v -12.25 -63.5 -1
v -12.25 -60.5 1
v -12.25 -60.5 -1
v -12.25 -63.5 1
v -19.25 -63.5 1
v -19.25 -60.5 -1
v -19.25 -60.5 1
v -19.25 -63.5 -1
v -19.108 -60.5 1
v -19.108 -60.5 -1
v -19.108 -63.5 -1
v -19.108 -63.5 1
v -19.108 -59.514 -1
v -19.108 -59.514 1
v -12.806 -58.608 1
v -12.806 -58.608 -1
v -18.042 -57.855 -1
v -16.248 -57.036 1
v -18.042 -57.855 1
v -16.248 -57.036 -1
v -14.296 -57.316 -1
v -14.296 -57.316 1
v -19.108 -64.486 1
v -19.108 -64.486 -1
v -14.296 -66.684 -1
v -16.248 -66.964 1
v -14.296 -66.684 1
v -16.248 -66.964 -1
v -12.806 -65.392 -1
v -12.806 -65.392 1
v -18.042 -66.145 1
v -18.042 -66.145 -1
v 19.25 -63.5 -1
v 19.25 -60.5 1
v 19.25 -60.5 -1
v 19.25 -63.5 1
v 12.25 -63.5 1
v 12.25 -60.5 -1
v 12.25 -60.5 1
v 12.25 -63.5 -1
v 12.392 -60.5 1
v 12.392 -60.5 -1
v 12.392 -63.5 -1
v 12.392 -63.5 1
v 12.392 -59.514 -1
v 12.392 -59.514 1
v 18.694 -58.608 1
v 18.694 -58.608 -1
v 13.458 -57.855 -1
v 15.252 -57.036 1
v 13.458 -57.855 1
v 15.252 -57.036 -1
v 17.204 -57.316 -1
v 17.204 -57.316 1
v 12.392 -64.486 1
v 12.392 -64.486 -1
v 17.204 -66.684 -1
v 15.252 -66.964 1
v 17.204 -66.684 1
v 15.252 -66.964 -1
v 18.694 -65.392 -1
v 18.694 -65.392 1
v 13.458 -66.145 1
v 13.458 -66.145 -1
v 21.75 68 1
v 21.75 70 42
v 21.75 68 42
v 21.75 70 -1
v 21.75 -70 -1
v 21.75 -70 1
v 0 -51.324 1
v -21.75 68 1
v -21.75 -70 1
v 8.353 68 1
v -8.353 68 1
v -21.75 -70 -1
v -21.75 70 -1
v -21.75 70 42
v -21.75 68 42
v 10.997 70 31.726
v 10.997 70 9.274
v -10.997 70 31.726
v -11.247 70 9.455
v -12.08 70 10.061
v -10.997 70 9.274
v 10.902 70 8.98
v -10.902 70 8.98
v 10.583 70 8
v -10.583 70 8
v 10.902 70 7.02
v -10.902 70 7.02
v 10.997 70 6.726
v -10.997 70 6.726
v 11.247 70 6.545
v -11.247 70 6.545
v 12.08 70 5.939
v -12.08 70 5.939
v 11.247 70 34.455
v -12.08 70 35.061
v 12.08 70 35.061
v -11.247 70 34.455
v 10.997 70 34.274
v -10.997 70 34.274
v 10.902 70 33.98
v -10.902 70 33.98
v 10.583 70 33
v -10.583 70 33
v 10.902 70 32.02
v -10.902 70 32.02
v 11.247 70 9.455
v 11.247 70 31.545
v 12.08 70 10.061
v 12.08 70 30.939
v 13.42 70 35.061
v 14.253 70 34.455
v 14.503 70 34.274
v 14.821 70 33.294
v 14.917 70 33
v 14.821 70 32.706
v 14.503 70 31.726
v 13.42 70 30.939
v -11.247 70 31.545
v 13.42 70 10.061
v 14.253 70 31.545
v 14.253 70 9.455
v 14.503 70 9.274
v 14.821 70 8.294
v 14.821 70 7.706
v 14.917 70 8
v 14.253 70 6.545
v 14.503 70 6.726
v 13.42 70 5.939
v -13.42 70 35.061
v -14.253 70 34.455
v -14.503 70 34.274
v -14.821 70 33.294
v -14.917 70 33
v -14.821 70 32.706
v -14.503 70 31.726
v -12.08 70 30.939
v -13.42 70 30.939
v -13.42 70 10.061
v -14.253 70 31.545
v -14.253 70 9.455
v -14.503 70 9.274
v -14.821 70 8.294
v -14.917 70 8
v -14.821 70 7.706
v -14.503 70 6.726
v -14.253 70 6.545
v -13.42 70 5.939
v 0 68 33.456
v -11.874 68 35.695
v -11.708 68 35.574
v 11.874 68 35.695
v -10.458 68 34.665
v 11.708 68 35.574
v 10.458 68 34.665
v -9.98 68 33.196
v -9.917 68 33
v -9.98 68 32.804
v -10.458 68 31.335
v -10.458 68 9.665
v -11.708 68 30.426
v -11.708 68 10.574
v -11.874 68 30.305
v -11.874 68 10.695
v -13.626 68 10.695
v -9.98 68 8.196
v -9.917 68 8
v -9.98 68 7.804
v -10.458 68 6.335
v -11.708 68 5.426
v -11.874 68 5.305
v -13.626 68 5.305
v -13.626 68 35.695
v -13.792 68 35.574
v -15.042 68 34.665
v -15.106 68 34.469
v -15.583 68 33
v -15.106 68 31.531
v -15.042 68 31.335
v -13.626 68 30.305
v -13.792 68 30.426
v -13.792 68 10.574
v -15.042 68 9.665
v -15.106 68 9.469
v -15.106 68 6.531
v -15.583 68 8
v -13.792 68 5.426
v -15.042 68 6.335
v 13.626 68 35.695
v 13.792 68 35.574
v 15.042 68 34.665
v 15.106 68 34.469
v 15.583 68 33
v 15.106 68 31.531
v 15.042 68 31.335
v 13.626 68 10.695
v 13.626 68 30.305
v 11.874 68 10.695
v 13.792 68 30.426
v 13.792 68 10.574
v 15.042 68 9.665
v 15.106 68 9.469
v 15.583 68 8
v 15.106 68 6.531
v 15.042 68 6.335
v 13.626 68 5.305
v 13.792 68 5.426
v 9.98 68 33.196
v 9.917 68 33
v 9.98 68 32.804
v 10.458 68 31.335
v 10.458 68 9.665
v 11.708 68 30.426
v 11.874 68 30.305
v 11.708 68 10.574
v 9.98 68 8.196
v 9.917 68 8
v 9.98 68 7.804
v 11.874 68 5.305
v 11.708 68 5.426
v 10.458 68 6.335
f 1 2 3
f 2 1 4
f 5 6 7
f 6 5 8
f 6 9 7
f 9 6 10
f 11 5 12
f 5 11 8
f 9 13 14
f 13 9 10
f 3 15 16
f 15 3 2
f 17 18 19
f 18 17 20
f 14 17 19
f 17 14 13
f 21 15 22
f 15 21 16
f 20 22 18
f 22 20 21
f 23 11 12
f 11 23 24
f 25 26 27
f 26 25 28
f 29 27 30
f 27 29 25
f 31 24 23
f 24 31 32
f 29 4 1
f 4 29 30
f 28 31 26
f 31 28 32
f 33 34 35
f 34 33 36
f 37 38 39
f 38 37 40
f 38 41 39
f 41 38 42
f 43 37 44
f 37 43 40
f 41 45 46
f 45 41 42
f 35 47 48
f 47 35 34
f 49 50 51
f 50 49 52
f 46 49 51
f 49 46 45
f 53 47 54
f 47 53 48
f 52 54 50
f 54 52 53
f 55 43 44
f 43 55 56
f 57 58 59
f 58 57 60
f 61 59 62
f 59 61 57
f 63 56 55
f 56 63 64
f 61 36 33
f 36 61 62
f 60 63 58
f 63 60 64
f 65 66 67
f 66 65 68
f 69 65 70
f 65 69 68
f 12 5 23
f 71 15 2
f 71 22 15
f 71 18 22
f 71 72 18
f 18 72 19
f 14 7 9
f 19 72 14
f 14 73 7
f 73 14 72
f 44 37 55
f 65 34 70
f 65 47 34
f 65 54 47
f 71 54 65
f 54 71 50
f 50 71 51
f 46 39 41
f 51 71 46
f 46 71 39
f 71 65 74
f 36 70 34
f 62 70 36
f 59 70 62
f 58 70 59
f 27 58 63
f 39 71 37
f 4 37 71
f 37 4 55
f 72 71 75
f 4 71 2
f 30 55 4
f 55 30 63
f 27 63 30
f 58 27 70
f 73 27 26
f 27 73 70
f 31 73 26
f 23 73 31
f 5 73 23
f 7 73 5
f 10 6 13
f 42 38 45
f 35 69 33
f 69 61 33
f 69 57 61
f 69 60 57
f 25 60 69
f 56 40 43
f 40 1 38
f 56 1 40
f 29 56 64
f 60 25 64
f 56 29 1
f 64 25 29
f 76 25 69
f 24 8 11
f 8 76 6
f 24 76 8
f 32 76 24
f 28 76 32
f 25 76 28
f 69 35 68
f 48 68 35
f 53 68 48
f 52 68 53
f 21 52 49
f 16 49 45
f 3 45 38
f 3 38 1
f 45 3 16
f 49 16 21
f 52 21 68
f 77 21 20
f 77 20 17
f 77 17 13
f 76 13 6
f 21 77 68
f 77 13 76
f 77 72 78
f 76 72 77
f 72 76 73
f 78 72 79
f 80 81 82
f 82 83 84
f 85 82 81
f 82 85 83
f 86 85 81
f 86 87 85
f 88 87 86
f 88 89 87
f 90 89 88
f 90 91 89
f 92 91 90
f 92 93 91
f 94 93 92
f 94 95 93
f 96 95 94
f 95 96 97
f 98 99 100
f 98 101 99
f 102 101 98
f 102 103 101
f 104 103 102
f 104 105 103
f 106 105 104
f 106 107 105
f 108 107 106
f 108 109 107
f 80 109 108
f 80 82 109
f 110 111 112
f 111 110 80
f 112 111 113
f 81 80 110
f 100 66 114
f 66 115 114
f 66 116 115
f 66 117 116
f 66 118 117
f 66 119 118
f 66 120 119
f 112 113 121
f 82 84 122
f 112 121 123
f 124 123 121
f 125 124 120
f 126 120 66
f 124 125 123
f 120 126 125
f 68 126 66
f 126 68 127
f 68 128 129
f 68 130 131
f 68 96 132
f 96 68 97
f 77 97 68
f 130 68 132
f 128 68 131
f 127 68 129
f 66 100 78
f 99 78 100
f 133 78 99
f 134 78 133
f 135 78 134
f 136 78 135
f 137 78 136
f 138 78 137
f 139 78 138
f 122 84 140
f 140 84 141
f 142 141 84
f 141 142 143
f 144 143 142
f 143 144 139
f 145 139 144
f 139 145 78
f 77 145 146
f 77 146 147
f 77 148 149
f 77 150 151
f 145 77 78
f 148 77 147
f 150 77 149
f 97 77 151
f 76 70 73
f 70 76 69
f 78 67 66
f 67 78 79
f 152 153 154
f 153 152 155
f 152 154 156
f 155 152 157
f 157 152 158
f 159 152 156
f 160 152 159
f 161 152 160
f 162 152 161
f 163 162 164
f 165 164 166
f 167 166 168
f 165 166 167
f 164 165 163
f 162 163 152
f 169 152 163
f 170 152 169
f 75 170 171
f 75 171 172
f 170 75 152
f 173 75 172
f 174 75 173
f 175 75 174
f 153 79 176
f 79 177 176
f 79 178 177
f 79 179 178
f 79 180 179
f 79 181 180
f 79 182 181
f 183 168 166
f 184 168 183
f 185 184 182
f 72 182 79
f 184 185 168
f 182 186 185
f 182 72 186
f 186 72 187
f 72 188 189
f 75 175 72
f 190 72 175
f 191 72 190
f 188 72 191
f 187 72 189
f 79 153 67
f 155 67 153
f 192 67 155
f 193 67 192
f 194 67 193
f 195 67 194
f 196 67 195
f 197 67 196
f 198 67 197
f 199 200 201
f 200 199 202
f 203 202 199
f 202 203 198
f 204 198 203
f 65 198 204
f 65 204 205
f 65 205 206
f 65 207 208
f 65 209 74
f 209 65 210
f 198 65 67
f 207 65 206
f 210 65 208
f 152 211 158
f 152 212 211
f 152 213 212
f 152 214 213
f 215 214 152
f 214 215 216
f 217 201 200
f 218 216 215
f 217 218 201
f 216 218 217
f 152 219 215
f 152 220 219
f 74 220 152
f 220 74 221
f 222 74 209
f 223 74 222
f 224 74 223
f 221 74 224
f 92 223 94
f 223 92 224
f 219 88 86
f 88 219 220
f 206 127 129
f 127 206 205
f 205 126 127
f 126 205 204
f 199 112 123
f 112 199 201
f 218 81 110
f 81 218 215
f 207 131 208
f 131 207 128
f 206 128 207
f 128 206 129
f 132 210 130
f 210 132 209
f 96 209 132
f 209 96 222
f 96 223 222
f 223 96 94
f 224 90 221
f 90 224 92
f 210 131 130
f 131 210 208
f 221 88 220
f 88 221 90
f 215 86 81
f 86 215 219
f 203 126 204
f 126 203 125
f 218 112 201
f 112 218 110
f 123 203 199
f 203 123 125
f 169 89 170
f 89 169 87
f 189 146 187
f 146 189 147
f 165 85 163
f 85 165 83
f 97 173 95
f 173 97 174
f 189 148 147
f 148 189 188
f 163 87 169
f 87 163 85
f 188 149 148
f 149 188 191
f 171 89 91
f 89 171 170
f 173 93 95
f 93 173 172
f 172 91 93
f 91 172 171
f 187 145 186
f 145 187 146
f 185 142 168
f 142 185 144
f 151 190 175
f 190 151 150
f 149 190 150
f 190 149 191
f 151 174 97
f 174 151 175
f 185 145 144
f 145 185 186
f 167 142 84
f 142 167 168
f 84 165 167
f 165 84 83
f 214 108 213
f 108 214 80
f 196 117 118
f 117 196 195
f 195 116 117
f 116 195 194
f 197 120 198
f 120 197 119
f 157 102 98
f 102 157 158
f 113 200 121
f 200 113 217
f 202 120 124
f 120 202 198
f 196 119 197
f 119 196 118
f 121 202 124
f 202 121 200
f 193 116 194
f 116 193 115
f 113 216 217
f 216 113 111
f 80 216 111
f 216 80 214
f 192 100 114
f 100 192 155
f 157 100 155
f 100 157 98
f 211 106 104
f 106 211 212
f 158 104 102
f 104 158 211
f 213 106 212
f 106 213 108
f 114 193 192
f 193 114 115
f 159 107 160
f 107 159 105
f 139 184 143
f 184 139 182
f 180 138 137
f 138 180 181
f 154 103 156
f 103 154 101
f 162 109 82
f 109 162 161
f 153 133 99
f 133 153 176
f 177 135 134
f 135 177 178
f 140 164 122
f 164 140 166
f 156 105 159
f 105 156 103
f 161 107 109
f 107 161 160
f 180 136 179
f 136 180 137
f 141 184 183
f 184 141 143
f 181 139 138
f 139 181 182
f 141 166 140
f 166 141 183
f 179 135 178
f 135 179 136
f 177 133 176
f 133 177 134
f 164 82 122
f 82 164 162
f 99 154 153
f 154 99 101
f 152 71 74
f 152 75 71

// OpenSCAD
l=140;
x1=9;
x2=25+9;
y=9;


//******* fixed
h=43.5; 
spessore=2;
x=x2+x1;

staffaFronte(h,l);
 translate ([0,l/2-spessore/2,x/2-spessore/2]) {
staffaLato();
 }
polyhedron(points=[[0,-l/2+15,0],[h/2-y-4,l/2,0],[-h/2+y+4,l/2,0],[0,l/2,x-x1]], faces=[[0,1,2],[1,0,3],[0,2,3],[2,1,3]]);
 
module staffaLato(){
difference() {
    
cube([h,spessore ,x],true);
    foro(h/2-y,-x/2+x1);
    foro(-h/2+y,-x/2+x1);
    foro(h/2-y,-x/2+x2);
    foro(-h/2+y,-x/2+x2);
}
}

    module staffaFronte(h,l){
difference() {
cube([h,l ,spessore],true);

    foroRack(-h/2+3.5+2.5,-l/2+3+3.5+1.5);
    foroRack(+h/2-3.5-2.5,-l/2+3+3.5+1.5);
}
}

module foroRack(x,y){
    translate ([x,y,0]) {
     cube([7,3,spessore*2],true);
    translate ([0,1.5,-spessore]) {
cylinder(spessore*2, 3.5,3.5);
    }
        translate ([0,-1.5,-spessore]) {
cylinder(spessore*2, 3.5,3.5);
    }
    }
    }
    
    
module foro(x,y){
    translate ([x,spessore*1.5/2,y]) {
        rotate([90,0,0]){
cylinder(spessore*1.5, 2,3);
        }
    }
}
